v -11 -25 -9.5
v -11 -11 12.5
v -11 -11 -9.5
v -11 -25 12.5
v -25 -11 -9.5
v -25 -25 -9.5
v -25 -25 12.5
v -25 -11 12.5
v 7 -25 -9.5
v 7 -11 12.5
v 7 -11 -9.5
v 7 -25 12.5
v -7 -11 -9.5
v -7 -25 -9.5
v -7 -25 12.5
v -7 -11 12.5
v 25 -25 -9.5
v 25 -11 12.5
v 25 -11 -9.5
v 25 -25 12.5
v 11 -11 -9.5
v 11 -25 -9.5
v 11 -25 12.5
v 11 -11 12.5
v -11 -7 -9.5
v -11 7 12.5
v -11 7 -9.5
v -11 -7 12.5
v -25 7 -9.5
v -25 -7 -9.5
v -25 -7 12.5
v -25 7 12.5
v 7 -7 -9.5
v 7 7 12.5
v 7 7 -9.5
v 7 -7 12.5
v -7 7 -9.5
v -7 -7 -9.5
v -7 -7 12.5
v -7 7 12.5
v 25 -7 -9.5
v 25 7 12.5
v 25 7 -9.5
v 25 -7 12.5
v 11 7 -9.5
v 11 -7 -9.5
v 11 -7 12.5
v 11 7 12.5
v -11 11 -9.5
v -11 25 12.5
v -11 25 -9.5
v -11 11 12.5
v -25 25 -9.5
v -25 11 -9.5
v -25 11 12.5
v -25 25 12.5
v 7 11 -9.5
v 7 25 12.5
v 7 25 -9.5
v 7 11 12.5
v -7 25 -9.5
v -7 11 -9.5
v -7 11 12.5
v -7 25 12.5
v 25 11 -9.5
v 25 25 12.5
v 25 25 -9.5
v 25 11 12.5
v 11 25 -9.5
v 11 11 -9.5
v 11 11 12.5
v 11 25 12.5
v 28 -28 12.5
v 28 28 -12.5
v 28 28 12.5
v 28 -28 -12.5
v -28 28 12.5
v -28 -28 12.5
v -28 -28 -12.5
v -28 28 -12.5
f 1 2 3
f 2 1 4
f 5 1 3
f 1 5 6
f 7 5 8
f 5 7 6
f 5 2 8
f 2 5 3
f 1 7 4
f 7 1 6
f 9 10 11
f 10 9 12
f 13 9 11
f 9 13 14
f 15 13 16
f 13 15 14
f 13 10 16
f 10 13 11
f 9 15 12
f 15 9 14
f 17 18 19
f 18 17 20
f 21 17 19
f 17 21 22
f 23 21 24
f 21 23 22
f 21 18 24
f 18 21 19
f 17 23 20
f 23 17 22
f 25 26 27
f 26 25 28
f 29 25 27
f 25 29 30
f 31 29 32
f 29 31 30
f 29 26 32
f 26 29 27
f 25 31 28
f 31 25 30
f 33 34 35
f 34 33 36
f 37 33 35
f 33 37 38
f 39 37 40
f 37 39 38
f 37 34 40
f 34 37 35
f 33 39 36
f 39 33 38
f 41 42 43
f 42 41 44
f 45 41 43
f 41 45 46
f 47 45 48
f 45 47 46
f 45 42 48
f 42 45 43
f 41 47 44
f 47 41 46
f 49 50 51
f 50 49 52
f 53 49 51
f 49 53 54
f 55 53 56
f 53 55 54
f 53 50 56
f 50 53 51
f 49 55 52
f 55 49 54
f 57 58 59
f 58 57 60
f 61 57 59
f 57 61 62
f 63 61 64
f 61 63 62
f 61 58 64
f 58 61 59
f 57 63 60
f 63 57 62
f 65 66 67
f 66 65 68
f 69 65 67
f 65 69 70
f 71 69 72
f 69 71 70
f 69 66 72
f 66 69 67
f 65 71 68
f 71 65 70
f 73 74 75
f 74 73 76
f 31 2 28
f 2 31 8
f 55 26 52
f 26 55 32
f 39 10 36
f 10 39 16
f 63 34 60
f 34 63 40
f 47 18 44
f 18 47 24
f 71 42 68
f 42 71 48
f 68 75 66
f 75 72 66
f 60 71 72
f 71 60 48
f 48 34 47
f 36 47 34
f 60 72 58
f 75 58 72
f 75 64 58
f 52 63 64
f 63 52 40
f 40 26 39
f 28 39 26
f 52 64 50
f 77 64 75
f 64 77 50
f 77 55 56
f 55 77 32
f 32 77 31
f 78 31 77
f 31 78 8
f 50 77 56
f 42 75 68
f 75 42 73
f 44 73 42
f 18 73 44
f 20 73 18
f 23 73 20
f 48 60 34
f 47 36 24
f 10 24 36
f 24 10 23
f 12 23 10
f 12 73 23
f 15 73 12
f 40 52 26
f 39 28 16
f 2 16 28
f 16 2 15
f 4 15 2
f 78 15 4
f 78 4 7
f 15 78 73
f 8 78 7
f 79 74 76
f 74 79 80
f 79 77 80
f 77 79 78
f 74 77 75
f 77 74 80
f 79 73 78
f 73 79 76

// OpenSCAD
$fn = 32;

// ----------------------------------------------------------------------
// Pocket plate 56 x 56 x 25
// 3 x 3 pockets 14 mm square, 22 mm deep
// ----------------------------------------------------------------------

// --- parameters (mm) ---
thickness = 25;  // plate thickness
floor_t = 3;     // material left under each pocket
pocket = 14;     // pocket side length
pitch_x = 18;    // pocket pitch along X
pitch_y = 18;    // pocket pitch along Y
cols = 3;        // pockets per row
rows = 3;        // rows of pockets

// --- derived feature positions (mm) ---
depth = thickness - floor_t;        // = 22   pocket depth, down to the floor
span_x = (cols - 1) * pitch_x;      // = 36   distance between outer pockets
span_y = (rows - 1) * pitch_y;      // = 36   distance between outer pocket rows
origin_x = -span_x / 2;             // = -18   X of the first pocket
origin_y = -span_y / 2;             // = -18   Y of the first pocket
plate = [span_x + pocket + 6, span_y + pocket + 6, thickness];  // = [56, 56, 25]   overall size: pockets plus 3 mm of wall on each side
feature_centers = [
  [origin_x + 0 * pitch_x, origin_y + 0 * pitch_y],
  [origin_x + 1 * pitch_x, origin_y + 0 * pitch_y],
  [origin_x + 2 * pitch_x, origin_y + 0 * pitch_y],
  [origin_x + 0 * pitch_x, origin_y + 1 * pitch_y],
  [origin_x + 1 * pitch_x, origin_y + 1 * pitch_y],
  [origin_x + 2 * pitch_x, origin_y + 1 * pitch_y],
  [origin_x + 0 * pitch_x, origin_y + 2 * pitch_y],
  [origin_x + 1 * pitch_x, origin_y + 2 * pitch_y],
  [origin_x + 2 * pitch_x, origin_y + 2 * pitch_y]
];   // pocket centres, used verbatim by the cutter loop

// plate outline, then one pocket per centre in feature_centers
difference() {
  cube(plate, center = true);
  for (centre = feature_centers)
    translate([centre[0] - pocket / 2, centre[1] - pocket / 2, plate[2] / 2 - depth])
      cube([pocket, pocket, depth + 1]);  // centred on the declared pocket centre
}
